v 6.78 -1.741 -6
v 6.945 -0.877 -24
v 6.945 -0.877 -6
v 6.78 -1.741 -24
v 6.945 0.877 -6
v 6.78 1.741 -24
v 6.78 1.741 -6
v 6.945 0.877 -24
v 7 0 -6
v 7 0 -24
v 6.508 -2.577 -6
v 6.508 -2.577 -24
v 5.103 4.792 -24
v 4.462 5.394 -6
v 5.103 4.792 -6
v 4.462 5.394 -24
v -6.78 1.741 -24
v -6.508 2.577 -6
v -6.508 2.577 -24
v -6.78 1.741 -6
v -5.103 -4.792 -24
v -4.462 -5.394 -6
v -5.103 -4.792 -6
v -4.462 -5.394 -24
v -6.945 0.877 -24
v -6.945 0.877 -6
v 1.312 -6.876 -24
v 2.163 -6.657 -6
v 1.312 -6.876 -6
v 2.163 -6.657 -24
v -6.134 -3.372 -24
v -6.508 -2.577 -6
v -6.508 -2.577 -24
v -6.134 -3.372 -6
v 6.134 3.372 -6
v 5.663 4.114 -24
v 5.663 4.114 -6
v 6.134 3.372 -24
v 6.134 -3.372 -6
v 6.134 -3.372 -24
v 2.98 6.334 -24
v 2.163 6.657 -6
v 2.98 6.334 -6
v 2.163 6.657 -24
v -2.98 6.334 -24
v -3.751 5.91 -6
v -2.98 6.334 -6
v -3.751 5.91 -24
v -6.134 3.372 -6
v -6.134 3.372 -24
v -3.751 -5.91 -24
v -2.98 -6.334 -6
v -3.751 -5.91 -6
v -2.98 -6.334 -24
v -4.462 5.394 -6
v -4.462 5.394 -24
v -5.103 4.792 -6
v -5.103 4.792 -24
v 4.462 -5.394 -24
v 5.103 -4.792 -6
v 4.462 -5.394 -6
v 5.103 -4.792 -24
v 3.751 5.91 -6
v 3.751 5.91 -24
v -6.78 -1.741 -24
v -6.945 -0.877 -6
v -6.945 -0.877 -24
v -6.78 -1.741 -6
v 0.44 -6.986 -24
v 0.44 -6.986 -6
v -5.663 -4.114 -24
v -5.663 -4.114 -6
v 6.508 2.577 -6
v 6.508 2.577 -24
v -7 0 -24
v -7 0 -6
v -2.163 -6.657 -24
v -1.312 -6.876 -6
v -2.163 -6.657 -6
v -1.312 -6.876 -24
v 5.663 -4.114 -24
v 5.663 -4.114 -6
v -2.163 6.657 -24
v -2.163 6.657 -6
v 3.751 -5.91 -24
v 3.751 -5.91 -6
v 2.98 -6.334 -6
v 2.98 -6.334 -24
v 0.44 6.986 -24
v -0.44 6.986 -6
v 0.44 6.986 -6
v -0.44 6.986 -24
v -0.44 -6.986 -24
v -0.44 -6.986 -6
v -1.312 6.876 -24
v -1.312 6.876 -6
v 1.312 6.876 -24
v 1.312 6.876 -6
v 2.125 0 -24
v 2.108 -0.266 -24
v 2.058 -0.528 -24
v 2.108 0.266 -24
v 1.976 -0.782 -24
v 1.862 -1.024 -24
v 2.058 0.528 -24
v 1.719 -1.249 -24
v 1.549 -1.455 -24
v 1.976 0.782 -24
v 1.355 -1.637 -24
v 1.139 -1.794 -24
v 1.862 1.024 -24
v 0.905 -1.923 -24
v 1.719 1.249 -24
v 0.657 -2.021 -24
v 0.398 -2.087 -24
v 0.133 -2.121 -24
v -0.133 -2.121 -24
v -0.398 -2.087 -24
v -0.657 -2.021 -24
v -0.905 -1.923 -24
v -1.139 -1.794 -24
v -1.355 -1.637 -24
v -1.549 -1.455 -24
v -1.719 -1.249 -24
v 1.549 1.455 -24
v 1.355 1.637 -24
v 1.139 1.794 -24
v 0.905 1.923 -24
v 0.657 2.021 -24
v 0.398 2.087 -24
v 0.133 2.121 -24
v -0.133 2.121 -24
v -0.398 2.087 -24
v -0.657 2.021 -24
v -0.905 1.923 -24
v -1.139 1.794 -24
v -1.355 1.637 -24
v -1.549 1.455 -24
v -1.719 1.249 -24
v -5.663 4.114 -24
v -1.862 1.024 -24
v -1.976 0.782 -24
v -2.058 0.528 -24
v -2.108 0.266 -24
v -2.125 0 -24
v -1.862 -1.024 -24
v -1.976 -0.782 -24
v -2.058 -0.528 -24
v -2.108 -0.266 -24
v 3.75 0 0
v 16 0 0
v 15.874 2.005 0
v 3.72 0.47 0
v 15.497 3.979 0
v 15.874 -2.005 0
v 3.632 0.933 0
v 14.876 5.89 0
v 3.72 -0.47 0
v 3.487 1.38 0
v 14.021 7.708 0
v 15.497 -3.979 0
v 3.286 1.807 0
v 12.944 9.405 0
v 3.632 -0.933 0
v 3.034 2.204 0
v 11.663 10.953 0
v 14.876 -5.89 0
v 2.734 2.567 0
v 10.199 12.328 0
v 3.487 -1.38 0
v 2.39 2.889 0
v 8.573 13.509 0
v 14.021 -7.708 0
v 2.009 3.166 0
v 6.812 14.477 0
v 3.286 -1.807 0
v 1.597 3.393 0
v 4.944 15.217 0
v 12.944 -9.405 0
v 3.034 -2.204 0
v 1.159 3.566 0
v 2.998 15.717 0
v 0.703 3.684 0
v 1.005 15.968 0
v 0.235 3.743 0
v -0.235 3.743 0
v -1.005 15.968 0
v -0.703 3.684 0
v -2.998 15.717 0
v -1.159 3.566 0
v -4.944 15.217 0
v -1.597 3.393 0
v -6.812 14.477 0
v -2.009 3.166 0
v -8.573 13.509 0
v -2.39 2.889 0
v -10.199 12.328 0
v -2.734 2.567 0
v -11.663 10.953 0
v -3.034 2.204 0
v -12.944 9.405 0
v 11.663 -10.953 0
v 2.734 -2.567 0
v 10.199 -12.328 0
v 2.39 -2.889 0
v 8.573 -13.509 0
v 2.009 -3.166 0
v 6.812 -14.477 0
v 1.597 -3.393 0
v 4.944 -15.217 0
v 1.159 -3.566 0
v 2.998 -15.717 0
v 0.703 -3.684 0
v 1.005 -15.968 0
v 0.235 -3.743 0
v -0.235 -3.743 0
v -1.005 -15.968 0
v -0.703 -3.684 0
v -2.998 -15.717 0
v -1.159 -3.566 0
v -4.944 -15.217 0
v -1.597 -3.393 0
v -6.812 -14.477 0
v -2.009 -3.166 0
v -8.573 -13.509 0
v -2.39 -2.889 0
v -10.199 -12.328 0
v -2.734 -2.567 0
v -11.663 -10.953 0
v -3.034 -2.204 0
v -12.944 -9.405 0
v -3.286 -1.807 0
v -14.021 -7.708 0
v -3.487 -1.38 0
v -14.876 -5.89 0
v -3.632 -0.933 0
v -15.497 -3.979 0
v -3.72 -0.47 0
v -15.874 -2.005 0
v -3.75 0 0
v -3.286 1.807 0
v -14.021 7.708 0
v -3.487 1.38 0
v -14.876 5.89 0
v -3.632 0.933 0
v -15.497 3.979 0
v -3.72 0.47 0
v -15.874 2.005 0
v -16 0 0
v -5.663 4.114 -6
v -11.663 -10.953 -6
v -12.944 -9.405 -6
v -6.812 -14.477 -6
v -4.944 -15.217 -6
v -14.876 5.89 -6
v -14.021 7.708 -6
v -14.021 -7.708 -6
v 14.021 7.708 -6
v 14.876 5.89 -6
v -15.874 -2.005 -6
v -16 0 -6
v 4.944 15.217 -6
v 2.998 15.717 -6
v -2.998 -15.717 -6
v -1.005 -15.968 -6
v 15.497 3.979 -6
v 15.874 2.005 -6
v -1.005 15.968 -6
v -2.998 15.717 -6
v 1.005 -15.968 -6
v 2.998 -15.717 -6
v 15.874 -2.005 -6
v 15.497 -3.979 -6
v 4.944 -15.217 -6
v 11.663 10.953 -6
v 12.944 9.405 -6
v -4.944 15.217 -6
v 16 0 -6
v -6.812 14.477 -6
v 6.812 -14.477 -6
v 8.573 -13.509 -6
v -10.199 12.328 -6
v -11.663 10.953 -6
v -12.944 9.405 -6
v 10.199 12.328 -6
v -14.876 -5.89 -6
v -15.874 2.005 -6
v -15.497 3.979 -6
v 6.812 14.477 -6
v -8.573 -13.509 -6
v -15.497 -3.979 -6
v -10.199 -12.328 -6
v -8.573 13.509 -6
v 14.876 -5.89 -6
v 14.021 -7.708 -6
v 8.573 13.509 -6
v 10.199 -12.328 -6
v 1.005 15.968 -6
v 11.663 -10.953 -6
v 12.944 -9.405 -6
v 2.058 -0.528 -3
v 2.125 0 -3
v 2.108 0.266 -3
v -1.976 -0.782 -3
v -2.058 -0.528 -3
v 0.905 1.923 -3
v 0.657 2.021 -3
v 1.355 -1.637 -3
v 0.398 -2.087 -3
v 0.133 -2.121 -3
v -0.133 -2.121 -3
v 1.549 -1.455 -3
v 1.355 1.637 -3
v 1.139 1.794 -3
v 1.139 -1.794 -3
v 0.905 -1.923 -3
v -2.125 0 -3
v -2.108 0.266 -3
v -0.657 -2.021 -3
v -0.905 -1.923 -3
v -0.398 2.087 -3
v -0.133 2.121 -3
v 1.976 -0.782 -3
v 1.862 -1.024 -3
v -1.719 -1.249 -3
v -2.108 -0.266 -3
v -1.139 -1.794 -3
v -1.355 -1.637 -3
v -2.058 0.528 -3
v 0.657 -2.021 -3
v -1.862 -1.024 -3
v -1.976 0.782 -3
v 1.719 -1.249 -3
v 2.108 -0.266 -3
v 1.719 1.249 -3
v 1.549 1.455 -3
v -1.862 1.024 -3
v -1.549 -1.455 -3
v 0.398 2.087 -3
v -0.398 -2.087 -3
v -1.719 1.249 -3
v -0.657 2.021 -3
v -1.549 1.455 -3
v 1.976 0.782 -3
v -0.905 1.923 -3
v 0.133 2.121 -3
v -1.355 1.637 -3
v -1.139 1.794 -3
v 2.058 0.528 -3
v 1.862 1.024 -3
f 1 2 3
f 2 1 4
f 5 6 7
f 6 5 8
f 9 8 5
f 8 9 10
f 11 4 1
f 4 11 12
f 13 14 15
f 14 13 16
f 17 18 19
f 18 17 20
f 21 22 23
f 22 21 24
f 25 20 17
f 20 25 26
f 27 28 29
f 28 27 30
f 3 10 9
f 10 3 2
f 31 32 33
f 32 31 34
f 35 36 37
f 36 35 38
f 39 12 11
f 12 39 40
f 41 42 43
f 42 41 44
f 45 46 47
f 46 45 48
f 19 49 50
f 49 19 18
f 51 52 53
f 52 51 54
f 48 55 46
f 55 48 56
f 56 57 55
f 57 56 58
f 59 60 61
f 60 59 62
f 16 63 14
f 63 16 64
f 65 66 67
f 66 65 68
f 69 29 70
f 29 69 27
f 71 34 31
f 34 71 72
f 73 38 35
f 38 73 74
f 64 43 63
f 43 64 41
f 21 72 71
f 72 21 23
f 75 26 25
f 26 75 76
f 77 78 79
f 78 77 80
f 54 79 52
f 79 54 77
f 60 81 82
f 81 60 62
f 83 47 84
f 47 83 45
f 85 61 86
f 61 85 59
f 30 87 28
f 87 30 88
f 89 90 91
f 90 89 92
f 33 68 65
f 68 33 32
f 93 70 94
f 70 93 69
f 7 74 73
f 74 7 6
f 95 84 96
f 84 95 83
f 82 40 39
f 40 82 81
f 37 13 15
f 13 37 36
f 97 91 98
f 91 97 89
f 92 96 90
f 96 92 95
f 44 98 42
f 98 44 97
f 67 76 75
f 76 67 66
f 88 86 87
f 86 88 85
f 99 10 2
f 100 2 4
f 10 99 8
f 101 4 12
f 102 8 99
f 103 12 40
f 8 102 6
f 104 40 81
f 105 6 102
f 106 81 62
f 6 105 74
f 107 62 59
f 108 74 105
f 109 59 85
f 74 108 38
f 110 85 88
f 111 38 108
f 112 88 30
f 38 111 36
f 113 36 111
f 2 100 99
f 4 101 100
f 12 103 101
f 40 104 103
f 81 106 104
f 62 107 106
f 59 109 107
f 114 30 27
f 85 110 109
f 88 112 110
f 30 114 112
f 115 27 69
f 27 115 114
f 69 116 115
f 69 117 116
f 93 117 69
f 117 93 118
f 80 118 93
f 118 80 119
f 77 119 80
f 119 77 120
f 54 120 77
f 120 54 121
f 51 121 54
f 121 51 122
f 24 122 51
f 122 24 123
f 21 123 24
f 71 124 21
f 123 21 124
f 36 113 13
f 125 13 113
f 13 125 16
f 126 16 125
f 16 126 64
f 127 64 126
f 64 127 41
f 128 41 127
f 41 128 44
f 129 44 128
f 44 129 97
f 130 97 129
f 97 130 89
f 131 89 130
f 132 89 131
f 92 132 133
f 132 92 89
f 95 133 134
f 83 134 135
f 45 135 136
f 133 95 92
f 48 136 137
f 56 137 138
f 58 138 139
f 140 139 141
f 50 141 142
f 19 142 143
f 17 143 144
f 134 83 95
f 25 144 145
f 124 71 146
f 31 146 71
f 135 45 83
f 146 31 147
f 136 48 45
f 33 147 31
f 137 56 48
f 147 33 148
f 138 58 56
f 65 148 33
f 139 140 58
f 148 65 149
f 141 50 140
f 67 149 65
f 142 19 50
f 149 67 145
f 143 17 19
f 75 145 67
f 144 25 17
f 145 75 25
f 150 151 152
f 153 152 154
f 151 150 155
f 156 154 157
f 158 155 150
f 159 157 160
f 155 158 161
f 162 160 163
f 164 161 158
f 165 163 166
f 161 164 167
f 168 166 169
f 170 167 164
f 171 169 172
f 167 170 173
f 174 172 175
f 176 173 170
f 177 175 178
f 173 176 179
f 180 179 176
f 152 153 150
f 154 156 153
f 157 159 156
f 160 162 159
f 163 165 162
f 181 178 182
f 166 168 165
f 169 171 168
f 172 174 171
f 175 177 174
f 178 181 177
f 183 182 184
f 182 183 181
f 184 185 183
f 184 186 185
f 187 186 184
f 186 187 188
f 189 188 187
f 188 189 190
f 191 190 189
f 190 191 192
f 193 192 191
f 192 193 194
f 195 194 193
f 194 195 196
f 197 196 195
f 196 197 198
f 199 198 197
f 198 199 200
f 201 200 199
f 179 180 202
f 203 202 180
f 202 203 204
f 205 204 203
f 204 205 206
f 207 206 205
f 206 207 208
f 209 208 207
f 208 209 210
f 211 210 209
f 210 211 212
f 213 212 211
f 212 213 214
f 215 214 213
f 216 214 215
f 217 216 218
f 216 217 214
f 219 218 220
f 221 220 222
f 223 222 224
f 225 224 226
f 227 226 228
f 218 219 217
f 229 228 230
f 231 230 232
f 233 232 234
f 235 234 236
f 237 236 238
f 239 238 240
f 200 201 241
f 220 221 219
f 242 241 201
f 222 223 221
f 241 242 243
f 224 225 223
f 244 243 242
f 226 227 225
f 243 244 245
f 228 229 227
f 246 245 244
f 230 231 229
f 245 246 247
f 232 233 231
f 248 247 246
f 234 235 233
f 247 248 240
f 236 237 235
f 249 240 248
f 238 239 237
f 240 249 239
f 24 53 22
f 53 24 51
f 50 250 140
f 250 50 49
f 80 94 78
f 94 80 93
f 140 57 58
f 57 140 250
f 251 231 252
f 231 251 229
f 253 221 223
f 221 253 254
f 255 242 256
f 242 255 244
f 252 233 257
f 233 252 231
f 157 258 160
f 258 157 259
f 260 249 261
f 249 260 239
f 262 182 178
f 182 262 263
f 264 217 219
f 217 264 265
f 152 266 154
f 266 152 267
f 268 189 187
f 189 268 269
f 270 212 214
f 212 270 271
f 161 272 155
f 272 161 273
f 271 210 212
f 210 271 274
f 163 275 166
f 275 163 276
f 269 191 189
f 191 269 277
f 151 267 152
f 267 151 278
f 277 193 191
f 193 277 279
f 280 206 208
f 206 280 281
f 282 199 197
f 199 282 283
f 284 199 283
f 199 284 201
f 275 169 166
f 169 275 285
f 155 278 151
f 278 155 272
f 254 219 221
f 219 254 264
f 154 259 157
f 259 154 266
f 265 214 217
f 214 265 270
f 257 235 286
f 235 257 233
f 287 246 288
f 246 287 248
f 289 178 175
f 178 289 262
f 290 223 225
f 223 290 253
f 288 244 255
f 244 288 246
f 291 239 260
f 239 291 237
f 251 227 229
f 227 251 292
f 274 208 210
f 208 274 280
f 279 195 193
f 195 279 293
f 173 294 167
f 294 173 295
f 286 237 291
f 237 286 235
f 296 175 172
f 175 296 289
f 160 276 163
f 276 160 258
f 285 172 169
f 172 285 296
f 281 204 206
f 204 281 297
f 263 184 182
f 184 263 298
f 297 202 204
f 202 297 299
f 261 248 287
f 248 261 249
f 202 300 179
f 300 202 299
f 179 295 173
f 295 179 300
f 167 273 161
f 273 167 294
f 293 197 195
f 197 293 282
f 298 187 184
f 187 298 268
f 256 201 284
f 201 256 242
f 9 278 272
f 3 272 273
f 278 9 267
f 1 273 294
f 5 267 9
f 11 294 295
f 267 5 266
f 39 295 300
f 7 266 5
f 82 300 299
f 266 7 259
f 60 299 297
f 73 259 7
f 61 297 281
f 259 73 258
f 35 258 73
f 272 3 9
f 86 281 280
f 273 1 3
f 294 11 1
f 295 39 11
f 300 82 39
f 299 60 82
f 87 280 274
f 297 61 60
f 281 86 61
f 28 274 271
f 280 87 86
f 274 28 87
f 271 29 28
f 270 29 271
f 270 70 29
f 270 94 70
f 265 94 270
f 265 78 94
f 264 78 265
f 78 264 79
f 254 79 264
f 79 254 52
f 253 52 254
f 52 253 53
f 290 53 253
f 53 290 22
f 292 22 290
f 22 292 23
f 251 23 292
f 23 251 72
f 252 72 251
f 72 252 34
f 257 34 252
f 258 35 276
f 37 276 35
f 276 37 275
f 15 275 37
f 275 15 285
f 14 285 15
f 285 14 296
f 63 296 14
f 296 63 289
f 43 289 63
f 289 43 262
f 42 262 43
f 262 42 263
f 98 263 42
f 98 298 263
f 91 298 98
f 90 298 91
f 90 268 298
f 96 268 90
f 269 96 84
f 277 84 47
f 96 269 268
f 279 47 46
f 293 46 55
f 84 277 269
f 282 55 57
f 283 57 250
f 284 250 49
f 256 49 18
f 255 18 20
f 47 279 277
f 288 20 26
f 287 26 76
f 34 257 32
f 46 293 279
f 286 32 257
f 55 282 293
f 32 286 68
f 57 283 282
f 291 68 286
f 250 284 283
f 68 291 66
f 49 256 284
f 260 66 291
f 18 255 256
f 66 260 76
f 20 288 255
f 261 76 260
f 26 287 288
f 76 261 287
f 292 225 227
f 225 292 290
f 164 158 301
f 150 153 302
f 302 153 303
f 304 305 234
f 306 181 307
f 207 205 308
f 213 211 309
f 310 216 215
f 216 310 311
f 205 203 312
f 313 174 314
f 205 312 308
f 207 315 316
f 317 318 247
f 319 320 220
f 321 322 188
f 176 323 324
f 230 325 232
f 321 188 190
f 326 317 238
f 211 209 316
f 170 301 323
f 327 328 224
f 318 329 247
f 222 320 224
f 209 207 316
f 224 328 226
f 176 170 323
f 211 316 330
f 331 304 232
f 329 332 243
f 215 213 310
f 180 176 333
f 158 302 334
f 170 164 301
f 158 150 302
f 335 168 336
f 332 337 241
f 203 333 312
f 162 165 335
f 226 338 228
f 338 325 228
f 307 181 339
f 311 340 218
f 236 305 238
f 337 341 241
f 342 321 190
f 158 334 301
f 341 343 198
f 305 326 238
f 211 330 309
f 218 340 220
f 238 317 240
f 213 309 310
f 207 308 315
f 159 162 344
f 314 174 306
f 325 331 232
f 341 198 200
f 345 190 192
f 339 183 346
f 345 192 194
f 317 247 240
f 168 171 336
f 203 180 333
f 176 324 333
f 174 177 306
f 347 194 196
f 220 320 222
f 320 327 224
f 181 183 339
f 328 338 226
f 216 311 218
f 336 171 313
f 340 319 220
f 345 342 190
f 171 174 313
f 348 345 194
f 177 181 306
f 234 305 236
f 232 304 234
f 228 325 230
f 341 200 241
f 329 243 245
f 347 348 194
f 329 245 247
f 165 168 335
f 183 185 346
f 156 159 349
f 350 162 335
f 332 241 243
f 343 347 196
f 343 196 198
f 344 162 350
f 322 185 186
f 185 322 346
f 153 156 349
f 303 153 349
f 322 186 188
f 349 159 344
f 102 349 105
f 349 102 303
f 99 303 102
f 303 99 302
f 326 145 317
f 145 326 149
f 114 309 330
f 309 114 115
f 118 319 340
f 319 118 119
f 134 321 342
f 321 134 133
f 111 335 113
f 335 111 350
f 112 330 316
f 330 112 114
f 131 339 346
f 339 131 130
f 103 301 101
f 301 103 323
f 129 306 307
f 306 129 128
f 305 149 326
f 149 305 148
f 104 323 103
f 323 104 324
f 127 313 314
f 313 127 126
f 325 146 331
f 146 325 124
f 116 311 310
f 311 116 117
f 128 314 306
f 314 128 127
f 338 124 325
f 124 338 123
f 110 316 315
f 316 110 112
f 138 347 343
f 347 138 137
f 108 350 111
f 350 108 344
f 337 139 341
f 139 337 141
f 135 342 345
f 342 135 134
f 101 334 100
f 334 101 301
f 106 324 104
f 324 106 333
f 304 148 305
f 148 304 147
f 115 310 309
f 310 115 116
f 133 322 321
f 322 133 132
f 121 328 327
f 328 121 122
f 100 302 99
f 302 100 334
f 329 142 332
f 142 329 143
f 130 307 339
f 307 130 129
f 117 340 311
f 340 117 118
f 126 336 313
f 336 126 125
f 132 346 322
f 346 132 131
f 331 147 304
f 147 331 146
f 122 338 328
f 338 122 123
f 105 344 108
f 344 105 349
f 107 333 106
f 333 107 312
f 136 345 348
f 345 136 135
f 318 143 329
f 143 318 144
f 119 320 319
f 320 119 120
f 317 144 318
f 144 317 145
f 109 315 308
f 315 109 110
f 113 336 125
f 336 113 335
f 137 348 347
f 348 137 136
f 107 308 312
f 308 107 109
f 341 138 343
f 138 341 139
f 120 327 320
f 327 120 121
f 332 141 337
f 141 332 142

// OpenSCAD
$fn = 50;


difference() {
	union() {
		translate(v = [0, 0, -24.0000000000]) {
			cylinder(h = 24, r = 7.0000000000);
		}
		translate(v = [0, 0, -6.0000000000]) {
			cylinder(h = 6, r = 16.0000000000);
		}
	}
	union() {
		translate(v = [0, 0, 0]) {
			rotate(a = [0, 0, 0]) {
				difference() {
					union() {
						#translate(v = [0, 0, -24.0000000000]) {
							cylinder(h = 24, r = 2.0000000000);
						}
						#translate(v = [0, 0, -3]) {
							cylinder(h = 3, r = 7.0000000000, r1 = 2.1250000000, r2 = 3.7500000000);
						}
						#translate(v = [0, 0, -24.0000000000]) {
							cylinder(h = 24, r = 2.1250000000);
						}
						#translate(v = [0, 0, -24.0000000000]) {
							cylinder(h = 24, r = 2.0000000000);
						}
					}
					union();
				}
			}
		}
	}
}
